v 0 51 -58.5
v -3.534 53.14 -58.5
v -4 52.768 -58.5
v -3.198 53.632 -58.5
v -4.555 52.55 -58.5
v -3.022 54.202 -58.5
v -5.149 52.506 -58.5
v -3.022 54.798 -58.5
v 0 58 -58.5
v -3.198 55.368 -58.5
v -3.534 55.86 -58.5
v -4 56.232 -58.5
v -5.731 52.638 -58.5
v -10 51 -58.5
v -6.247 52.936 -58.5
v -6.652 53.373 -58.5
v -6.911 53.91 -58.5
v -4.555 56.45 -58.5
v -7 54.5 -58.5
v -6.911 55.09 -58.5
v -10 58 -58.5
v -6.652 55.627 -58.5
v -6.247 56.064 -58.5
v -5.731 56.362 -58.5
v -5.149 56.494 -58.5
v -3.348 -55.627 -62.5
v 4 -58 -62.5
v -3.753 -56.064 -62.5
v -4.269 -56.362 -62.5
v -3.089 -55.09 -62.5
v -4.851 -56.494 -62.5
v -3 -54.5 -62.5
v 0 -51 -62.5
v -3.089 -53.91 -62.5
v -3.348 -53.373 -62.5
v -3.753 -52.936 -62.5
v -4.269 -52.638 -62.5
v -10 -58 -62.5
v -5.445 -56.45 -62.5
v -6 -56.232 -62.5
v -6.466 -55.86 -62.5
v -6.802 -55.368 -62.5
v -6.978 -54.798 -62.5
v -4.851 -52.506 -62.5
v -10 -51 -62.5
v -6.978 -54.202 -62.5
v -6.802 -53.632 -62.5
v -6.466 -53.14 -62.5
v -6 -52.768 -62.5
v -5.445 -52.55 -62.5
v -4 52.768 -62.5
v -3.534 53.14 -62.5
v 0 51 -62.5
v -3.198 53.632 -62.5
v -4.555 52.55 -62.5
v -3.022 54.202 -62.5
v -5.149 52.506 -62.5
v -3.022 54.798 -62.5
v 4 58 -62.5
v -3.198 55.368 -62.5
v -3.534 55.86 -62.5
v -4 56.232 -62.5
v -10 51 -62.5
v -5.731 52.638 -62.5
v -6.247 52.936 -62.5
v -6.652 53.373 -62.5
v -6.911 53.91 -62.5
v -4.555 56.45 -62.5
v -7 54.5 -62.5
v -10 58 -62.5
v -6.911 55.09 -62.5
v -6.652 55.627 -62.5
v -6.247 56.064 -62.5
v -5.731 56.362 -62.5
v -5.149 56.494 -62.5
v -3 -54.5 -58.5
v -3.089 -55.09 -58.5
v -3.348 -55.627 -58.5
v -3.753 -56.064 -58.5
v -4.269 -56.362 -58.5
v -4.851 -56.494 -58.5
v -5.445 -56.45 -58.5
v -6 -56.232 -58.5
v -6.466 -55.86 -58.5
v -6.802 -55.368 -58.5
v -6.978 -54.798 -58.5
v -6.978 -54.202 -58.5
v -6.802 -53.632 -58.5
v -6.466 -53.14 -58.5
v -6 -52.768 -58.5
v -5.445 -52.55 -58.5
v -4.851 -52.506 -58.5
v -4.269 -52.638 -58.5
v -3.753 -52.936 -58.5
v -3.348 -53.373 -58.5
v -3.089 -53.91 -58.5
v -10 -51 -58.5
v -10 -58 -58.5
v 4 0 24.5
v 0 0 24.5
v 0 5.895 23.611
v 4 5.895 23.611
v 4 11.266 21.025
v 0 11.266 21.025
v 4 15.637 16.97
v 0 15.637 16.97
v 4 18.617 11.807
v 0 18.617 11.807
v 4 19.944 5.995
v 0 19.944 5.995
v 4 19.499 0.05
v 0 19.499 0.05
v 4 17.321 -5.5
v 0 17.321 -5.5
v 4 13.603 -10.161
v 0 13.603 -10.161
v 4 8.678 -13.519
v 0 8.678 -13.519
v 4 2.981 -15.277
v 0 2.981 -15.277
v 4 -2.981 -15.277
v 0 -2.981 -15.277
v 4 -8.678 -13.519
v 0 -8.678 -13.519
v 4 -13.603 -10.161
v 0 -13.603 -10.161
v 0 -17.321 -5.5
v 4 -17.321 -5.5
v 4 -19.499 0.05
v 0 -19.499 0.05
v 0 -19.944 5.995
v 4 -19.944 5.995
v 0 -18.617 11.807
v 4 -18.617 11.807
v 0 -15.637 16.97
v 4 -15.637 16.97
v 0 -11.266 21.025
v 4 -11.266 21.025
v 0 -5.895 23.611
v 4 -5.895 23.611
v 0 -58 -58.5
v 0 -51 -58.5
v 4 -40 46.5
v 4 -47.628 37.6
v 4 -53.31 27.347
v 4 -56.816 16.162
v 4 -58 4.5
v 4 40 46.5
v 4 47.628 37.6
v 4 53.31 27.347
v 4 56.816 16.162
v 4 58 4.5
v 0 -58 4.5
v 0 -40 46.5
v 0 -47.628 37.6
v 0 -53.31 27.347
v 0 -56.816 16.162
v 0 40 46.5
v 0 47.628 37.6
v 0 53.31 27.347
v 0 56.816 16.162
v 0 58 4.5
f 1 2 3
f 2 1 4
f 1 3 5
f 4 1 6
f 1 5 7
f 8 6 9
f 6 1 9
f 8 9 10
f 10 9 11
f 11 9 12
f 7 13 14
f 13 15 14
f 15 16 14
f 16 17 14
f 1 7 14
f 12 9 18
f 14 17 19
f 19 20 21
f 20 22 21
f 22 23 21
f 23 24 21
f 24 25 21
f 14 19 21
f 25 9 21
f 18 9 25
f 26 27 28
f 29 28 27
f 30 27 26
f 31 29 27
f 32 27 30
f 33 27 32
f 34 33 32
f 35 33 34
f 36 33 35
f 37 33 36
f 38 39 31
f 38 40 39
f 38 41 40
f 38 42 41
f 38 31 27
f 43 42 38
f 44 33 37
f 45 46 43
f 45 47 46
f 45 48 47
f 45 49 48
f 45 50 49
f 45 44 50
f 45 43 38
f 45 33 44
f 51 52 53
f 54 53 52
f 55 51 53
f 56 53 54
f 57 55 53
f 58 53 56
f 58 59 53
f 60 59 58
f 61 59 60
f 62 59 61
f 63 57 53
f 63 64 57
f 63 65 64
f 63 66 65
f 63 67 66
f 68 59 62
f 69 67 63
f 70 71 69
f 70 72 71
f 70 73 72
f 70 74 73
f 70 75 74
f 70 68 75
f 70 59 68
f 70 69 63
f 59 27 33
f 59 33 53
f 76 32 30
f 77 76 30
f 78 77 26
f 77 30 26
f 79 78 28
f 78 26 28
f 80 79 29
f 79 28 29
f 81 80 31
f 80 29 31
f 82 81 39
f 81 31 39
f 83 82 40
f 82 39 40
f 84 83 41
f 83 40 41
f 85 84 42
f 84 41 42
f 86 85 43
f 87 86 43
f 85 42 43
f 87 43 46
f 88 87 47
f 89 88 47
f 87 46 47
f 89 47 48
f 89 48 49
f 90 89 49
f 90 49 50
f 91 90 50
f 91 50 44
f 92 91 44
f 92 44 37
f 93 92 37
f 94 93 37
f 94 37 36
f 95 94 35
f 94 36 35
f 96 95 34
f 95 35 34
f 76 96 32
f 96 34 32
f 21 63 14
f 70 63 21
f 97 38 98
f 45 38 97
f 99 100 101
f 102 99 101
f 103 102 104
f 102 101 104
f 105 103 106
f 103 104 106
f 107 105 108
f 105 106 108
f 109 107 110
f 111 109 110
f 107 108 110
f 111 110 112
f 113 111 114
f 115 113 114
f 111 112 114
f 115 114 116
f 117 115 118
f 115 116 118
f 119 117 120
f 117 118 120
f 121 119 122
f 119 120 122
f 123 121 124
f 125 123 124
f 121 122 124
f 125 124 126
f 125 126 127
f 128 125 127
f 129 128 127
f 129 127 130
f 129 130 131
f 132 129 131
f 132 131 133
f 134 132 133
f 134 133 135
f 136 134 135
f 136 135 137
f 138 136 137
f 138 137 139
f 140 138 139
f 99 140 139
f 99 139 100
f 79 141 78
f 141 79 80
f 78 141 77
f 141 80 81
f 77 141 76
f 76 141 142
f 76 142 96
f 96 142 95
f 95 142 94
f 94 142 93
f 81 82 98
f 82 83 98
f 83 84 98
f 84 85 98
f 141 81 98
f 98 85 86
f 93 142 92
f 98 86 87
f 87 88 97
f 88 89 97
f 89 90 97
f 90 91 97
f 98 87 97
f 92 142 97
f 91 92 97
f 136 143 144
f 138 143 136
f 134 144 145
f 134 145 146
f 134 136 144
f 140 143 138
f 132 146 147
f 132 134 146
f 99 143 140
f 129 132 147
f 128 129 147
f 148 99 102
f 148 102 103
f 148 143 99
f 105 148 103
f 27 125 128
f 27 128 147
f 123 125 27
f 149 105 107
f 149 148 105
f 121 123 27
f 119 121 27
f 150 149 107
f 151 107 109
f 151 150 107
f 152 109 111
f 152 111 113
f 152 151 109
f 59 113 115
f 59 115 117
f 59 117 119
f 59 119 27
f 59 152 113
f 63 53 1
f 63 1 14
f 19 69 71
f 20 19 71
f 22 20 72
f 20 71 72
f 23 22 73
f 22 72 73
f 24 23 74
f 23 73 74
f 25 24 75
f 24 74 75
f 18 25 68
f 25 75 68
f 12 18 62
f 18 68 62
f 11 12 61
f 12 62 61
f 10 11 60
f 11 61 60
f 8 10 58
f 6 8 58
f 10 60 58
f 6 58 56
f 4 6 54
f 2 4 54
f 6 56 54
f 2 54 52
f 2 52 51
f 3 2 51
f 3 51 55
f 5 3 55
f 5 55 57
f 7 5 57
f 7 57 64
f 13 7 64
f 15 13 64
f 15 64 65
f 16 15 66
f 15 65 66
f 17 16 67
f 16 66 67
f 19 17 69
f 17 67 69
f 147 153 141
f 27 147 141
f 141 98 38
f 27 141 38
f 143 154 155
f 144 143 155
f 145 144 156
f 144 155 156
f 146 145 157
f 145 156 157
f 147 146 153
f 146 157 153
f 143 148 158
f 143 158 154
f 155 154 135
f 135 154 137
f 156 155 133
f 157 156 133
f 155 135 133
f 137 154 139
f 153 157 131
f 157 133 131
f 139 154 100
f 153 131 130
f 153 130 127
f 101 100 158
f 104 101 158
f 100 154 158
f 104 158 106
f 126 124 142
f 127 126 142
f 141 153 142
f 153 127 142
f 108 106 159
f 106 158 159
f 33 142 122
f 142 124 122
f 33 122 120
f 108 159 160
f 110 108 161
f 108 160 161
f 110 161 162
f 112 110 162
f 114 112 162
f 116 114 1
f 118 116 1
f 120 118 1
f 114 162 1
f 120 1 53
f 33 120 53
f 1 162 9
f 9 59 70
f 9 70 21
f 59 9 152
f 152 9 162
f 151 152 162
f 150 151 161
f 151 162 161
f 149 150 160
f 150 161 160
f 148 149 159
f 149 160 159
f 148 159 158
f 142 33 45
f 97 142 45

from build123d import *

# Parameters (mm, degrees)
SKETCH1_R           = 12
BOSS_EXTRUDE1_DEPTH = 4
SKETCH7_W           = 10
SKETCH7_H           = 7
SKETCH7_R           = 2
BOSS_EXTRUDE4_DEPTH = 4
SKETCH8_R           = 20
CUT_EXTRUDE3_DEPTH  = 86.850160163
CUT_EXTRUDE4_DEPTH  = 87.407464955


with BuildPart() as part:
    # Sketch1 → Boss-Extrude1 (new body)
    with BuildSketch(Plane(origin=(0, 0, 0), x_dir=(0, 0, -1), z_dir=(1, 0, 0))):
        with BuildLine():
            Line((62.5, 58), (-4.5, 58))
            ThreePointArc((-4.5, 58), (-62.5, 0), (-4.5, -58))
            Line((-4.5, -58), (62.5, -58))
            Line((62.5, -58), (62.5, 58))
        make_face()
        with Locations((-4.5, 0)):
            Circle(SKETCH1_R, mode=Mode.SUBTRACT)
    extrude(amount=BOSS_EXTRUDE1_DEPTH)

    # Sketch7 → Boss-Extrude4 (add)
    # profile 1 of 2: a face of its own
    with BuildSketch(Plane(origin=(0, 0, -62.5), x_dir=(-1, 0, 0), z_dir=(0, 0, -1))):
        with Locations((5, 54.5)):
            Rectangle(SKETCH7_W, SKETCH7_H)
        with Locations((5, 54.5)):
            Circle(SKETCH7_R, mode=Mode.SUBTRACT)
    # profile 2 of 2: a face of its own
    with BuildSketch(Plane(origin=(0, 0, -62.5), x_dir=(-1, 0, 0), z_dir=(0, 0, -1))):
        with Locations((5, -54.5)):
            Rectangle(SKETCH7_W, SKETCH7_H)
        with Locations(Location((5, -54.5, 0), (0, 0, 180))):
            Circle(SKETCH7_R, mode=Mode.SUBTRACT)
    extrude(amount=-BOSS_EXTRUDE4_DEPTH)

    # Sketch8 → Cut-Extrude3 (cut, through all)
    with BuildSketch(Plane.ZY):
        with Locations((4.5, 0)):
            Circle(SKETCH8_R)
    extrude(amount=-CUT_EXTRUDE3_DEPTH, mode=Mode.SUBTRACT)

    # Sketch9 → Cut-Extrude4 (cut, through all)
    with BuildSketch(Plane(origin=(4, 0, 0), x_dir=(0, 0, -1), z_dir=(1, 0, 0))):
        with BuildLine():
            Line((-46.5, 40), (-46.5, -40))
            ThreePointArc((-46.5, -40), (-62.5, 0), (-46.5, 40))
        make_face()
    extrude(amount=-CUT_EXTRUDE4_DEPTH, mode=Mode.SUBTRACT)


solid = part.part
